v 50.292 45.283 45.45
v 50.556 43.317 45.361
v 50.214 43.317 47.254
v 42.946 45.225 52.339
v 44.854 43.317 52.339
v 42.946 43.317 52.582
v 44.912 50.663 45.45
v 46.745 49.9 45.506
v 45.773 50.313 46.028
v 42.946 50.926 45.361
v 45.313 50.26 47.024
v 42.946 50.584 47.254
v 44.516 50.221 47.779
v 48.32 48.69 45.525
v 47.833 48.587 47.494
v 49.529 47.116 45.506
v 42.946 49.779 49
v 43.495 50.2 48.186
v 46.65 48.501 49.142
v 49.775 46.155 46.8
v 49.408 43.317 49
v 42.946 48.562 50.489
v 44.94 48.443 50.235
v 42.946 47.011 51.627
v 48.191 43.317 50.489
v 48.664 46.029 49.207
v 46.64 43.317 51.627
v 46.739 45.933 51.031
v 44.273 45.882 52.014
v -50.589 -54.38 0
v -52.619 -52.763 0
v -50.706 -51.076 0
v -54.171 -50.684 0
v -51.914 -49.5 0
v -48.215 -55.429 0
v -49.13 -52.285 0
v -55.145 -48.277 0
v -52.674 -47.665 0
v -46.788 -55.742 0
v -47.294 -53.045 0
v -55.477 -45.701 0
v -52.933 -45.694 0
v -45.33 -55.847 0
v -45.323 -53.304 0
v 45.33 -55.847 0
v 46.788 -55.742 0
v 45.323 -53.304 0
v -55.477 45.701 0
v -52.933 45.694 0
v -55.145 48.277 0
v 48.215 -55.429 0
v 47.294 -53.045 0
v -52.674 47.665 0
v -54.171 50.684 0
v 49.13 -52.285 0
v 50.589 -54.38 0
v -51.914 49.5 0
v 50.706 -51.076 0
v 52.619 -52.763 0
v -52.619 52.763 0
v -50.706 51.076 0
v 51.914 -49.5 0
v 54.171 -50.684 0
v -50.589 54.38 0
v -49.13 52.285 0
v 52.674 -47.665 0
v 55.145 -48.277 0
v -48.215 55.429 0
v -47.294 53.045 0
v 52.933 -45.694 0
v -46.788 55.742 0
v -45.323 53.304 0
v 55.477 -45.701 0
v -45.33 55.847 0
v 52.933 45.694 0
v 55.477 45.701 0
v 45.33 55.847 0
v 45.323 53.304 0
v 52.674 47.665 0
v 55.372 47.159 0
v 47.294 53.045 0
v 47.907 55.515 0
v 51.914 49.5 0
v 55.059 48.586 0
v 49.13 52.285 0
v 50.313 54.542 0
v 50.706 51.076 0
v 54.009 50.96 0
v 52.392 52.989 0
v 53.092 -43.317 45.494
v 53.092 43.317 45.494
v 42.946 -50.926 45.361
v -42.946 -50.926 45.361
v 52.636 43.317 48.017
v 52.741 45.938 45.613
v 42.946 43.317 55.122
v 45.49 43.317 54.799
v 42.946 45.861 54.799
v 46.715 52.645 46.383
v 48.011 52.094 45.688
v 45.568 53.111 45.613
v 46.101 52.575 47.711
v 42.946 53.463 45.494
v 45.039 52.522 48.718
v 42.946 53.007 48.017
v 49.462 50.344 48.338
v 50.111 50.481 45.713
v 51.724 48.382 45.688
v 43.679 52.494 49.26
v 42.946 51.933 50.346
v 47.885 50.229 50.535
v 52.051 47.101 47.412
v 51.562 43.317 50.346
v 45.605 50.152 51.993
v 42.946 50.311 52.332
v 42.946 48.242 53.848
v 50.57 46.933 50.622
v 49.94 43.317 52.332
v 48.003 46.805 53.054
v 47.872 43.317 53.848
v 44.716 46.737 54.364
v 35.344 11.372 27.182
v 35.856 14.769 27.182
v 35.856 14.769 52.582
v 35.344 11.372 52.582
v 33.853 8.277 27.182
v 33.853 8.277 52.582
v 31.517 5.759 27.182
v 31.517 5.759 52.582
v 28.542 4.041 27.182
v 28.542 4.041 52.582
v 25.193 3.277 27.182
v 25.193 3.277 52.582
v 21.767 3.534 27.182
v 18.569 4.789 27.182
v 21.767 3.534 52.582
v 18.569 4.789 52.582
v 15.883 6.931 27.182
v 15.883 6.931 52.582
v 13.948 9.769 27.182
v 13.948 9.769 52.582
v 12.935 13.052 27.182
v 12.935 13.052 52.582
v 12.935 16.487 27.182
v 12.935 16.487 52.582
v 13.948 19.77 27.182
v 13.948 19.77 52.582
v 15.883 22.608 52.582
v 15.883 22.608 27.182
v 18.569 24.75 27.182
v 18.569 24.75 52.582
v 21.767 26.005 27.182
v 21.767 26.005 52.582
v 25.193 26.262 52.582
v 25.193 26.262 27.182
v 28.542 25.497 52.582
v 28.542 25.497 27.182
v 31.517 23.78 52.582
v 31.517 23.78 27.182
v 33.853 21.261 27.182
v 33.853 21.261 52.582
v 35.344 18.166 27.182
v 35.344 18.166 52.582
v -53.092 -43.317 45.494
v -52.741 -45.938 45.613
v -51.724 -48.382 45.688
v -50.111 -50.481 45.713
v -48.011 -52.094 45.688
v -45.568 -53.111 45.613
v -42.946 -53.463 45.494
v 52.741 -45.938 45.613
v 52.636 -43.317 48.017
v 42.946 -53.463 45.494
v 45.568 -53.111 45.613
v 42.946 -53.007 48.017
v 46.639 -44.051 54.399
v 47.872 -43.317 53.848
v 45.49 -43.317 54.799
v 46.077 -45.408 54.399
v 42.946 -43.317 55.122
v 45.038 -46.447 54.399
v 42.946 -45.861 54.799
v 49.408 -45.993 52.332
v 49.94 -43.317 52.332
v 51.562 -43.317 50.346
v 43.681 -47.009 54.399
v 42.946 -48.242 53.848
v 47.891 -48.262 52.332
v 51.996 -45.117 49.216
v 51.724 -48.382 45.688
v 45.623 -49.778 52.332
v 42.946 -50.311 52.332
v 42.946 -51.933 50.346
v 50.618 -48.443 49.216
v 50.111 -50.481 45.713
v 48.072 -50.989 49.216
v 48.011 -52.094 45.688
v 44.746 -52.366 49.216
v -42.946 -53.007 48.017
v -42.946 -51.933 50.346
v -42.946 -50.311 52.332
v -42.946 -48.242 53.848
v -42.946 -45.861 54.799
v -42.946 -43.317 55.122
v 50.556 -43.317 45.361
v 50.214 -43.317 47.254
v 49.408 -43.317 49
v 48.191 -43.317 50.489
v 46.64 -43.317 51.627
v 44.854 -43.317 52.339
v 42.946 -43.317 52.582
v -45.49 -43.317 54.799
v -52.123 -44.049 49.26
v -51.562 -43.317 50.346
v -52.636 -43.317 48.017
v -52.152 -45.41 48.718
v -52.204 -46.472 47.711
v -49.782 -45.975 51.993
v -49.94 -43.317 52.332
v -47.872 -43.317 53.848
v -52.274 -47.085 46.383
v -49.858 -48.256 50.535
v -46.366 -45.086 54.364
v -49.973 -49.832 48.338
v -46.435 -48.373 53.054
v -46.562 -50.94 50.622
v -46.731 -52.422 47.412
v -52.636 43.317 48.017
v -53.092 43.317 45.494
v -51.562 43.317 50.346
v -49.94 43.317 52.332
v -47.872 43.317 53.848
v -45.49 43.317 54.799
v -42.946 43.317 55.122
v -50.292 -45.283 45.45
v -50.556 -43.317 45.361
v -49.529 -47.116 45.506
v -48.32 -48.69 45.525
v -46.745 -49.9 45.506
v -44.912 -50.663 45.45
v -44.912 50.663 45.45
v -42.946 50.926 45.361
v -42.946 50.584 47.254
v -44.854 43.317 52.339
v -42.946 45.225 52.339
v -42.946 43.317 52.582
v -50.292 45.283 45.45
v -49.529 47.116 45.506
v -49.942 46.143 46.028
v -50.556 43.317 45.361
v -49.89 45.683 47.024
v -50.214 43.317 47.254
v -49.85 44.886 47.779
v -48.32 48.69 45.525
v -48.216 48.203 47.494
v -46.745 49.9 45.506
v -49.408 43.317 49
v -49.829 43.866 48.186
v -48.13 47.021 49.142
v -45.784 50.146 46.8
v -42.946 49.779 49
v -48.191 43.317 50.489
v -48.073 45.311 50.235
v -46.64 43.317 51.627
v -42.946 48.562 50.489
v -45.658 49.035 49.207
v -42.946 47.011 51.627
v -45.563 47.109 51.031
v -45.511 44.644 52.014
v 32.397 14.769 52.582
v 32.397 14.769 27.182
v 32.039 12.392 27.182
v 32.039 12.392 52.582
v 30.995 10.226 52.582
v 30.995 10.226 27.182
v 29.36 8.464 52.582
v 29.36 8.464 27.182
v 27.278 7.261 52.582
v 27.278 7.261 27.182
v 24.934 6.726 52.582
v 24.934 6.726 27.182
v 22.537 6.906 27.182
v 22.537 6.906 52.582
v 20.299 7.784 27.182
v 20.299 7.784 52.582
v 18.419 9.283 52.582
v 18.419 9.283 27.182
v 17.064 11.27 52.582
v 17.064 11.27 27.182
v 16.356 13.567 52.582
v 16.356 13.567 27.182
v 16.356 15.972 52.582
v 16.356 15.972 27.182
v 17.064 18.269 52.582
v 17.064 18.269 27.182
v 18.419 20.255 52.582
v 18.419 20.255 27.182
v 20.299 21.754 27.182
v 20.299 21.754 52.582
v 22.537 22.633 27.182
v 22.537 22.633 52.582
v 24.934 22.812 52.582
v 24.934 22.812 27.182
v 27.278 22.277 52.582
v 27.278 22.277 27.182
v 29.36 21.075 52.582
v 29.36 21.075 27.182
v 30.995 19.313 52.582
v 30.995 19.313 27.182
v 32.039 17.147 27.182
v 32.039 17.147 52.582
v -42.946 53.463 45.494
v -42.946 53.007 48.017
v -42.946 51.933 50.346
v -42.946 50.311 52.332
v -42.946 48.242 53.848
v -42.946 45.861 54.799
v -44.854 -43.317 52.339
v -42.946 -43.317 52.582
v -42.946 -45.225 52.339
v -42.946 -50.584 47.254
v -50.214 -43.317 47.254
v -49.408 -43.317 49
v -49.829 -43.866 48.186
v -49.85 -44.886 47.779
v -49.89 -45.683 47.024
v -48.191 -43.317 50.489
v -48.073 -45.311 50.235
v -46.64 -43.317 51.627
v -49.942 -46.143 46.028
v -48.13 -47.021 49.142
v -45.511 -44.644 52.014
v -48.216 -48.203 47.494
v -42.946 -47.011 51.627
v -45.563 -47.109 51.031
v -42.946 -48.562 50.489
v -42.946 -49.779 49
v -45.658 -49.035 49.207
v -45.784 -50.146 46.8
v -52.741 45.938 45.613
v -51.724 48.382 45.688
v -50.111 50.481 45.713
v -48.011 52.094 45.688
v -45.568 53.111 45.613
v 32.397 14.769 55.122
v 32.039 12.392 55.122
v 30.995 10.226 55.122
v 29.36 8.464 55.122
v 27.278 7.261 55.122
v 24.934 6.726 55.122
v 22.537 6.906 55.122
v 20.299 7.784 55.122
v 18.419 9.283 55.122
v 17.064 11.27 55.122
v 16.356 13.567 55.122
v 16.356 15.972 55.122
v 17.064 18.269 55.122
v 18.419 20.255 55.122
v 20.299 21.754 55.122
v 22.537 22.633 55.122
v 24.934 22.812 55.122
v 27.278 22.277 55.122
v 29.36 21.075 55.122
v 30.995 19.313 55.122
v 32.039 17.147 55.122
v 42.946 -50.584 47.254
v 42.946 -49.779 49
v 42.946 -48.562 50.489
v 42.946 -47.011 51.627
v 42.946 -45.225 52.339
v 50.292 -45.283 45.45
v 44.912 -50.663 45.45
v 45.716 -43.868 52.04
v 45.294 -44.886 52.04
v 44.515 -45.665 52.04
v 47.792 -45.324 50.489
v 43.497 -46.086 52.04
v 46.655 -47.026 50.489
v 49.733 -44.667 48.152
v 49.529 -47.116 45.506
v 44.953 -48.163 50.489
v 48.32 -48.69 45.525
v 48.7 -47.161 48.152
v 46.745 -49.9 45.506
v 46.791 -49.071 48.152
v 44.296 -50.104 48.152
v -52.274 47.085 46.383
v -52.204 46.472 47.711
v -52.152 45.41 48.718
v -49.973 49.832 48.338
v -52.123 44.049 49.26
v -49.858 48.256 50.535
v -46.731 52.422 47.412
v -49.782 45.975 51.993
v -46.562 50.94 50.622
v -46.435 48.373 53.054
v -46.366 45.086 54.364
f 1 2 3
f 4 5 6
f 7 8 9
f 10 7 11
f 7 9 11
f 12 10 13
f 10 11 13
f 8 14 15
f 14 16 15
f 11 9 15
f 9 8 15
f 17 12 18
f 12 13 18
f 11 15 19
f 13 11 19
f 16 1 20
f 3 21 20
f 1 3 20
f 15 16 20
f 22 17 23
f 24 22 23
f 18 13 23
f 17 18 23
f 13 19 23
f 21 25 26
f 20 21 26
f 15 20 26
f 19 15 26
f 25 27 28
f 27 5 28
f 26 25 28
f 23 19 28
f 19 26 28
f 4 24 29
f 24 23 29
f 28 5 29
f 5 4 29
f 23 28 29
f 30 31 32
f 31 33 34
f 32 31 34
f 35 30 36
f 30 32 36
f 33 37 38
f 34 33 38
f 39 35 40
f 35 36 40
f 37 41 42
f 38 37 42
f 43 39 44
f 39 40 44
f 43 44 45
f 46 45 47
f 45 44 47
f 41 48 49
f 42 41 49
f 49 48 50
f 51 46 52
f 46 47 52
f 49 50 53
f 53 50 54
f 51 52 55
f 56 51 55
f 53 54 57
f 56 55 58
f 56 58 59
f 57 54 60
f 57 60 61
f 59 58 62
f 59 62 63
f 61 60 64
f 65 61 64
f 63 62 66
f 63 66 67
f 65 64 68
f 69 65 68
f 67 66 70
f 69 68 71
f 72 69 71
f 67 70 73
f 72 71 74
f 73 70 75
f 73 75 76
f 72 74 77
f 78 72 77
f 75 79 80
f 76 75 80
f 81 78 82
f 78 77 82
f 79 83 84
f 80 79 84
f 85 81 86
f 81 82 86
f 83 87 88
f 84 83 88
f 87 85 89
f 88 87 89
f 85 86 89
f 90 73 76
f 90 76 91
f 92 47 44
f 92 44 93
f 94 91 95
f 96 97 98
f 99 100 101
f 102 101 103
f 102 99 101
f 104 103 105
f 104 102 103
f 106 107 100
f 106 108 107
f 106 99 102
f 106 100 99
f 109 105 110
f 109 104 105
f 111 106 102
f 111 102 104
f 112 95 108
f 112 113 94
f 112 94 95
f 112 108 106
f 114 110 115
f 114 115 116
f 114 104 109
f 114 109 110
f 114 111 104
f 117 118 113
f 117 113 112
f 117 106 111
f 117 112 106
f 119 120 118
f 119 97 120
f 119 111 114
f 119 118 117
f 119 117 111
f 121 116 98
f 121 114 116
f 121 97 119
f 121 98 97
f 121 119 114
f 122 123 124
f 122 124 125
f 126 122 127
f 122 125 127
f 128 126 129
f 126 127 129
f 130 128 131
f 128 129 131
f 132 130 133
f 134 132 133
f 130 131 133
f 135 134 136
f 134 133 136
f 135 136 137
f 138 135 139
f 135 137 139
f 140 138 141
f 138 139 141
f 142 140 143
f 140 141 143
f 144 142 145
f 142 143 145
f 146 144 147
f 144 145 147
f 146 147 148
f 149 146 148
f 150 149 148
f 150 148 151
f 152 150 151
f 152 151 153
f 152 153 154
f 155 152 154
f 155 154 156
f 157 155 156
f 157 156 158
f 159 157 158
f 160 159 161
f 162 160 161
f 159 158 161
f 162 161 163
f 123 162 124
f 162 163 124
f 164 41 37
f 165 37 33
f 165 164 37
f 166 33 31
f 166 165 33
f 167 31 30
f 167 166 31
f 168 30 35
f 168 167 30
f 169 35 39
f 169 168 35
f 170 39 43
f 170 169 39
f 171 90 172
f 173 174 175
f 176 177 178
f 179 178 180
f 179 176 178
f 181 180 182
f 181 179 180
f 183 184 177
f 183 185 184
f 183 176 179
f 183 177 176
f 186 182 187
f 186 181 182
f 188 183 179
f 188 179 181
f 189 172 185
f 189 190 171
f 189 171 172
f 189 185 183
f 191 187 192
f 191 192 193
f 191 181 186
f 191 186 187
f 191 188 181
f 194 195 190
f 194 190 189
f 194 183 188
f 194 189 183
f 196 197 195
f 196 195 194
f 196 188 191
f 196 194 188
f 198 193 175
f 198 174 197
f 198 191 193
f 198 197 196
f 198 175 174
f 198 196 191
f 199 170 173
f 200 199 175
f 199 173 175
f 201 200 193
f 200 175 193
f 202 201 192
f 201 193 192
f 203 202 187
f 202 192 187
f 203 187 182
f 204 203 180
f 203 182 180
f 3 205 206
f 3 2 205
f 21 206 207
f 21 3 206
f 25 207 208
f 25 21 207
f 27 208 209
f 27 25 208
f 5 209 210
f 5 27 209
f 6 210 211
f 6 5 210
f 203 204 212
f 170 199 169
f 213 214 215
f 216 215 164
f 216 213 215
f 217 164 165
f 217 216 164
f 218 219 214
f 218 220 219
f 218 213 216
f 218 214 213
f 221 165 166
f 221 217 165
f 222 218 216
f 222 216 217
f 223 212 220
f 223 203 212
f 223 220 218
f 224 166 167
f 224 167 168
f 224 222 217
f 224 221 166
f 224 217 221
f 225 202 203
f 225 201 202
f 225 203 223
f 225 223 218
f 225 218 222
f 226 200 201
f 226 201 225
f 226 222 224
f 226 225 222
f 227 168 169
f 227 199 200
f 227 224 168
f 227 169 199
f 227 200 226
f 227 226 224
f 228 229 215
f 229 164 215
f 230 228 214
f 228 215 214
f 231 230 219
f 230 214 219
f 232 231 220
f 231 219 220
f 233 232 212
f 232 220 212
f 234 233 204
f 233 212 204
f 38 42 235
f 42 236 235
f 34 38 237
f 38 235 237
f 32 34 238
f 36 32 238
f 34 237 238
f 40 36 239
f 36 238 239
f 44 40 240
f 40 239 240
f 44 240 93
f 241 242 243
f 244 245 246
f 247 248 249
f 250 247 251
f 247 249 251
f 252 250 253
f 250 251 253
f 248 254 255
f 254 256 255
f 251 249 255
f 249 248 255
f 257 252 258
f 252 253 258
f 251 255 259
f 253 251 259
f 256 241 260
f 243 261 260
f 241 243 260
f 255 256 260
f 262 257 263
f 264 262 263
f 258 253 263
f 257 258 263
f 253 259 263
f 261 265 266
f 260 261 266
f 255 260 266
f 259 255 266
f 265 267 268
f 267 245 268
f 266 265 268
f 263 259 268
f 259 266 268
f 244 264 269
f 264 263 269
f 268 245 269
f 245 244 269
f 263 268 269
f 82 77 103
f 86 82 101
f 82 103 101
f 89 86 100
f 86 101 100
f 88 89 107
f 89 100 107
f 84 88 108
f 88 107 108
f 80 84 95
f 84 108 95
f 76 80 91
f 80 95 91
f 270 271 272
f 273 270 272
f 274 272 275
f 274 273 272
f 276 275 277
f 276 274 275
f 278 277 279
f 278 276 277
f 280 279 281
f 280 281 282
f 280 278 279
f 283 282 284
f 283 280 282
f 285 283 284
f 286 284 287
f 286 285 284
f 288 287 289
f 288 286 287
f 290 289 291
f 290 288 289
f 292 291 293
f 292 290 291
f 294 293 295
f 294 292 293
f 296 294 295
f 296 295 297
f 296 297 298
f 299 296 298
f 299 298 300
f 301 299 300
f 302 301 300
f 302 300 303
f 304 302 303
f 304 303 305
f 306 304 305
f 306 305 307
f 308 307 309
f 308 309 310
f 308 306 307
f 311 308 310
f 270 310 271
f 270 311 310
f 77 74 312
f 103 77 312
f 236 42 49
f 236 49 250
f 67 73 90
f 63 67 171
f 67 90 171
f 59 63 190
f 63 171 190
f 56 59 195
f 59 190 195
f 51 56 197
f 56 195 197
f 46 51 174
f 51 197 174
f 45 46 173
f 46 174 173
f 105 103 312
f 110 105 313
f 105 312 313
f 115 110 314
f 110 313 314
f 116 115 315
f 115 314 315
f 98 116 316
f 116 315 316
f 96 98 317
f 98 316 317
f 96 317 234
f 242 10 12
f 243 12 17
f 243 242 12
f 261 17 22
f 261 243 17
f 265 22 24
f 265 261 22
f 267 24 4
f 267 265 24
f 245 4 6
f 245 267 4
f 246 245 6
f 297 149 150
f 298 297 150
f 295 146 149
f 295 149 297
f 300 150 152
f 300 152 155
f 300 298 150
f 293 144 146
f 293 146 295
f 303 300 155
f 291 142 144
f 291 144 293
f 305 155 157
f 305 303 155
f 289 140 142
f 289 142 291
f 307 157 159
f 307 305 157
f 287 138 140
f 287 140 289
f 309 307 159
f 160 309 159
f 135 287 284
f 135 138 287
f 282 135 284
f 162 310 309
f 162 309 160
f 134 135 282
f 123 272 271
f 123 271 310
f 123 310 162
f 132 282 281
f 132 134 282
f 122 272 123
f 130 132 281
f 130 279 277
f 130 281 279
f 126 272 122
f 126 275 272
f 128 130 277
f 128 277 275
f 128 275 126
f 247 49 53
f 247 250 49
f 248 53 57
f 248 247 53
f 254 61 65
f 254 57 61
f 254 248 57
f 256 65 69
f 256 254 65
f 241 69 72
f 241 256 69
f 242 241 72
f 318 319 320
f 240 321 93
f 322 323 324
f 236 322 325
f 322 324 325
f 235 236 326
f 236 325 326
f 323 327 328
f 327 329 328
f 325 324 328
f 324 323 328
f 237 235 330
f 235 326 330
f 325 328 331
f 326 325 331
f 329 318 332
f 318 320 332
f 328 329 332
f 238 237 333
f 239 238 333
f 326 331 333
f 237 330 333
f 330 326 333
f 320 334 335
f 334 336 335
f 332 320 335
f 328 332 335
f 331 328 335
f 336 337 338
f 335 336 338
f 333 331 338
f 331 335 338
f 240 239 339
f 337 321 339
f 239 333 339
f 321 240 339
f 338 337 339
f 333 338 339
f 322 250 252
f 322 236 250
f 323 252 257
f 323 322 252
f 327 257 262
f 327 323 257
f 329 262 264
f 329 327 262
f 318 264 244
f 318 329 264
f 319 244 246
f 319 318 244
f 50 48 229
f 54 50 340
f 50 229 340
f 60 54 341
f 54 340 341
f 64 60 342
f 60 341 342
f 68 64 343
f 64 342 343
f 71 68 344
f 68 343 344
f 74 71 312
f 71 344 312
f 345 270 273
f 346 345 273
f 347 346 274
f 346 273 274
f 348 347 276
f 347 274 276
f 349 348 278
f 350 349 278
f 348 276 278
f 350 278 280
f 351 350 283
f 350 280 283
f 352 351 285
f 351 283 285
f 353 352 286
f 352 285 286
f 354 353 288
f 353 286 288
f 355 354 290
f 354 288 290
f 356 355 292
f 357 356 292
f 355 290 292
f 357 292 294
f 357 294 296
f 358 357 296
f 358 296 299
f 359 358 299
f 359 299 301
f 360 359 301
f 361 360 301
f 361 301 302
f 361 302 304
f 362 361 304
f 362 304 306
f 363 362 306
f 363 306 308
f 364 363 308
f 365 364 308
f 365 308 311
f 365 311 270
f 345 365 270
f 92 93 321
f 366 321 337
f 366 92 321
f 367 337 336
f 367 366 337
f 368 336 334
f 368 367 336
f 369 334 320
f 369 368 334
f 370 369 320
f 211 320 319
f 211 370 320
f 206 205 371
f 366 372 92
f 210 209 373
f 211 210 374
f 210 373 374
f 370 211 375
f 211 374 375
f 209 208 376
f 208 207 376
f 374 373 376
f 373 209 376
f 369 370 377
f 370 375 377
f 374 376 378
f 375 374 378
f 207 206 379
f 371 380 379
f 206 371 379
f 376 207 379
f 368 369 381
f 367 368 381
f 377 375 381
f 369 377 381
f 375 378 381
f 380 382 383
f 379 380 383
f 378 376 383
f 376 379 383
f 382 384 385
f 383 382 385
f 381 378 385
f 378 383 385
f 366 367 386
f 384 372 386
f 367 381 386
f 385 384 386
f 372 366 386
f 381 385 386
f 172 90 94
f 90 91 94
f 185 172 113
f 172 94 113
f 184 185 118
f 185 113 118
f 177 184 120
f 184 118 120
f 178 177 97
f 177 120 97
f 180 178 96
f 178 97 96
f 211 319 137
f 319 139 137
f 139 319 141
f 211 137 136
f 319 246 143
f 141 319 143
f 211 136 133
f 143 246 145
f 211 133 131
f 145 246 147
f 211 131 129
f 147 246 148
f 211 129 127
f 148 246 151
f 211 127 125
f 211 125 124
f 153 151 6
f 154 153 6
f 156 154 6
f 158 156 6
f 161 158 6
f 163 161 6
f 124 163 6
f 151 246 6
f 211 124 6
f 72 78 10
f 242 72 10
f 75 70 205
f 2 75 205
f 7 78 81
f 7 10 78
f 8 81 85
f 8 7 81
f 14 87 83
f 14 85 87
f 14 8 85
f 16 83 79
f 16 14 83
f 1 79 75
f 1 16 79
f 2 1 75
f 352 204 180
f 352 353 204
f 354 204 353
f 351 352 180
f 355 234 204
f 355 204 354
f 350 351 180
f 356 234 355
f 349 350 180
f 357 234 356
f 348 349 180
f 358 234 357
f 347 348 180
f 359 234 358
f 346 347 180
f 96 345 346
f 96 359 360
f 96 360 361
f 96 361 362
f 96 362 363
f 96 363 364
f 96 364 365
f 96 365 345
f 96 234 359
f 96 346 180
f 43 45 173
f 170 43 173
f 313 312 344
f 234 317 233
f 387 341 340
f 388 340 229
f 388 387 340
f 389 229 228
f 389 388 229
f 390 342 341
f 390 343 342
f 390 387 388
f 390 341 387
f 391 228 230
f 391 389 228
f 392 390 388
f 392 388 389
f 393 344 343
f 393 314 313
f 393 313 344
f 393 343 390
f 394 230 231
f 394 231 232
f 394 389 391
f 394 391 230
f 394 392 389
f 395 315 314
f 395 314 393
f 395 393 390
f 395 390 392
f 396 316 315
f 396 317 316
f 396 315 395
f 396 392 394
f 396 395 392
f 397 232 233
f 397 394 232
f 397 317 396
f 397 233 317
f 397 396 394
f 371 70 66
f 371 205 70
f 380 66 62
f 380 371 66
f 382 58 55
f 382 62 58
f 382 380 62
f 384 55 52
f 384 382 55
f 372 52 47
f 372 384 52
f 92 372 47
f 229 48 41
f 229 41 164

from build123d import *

# Parameters (mm, degrees)
F0_W     = 110.9530478716
F0_H     = 111.6942763329
F1_DEPTH = 55.1221389323
F1_TAPER = 3
F2_R     = 10.16
F3_T     = -2.54
F4_R     = 11.5246315094
F4_R_2   = 8.0655463765
F5_DEPTH = 25.4
F6_DEPTH = 25.4


with BuildPart() as f1:
    # F0 (on Top) → F1 (new body)
    with BuildSketch(Plane.XY):
        Rectangle(F0_W, F0_H)
    extrude(amount=F1_DEPTH, taper=F1_TAPER)

    # F2
    f2_edges = [f1.edges().sort_by_distance(p)[0] for p in [
        (54.032109, -54.402724, 27.561069),
        (52.587695, 0, 55.122139),
        (0, -52.958309, 55.122139),
        (54.032109, 54.402724, 27.561069),
        (0, 52.958309, 55.122139),
        (-54.032109, 54.402724, 27.561069),
        (-52.587695, 0, 55.122139),
        (-54.032109, -54.402724, 27.561069),
    ]]
    fillet(f2_edges, radius=F2_R)

    # F3
    f3_openings = [f1.faces().sort_by_distance(p)[0] for p in [
        (0, 0, 0),
    ]]
    offset(amount=F3_T, openings=f3_openings)

    # F4 (on face) → F5 (join)
    with BuildSketch(Plane(origin=(0, 0, 52.5821389323), x_dir=(1, 0, 0), z_dir=(0, 0, -1))):
        with Locations((24.3312865496, -14.7694125772)):
            Circle(F4_R)
        with Locations((24.3312865496, -14.7694125772)):
            Circle(F4_R_2, mode=Mode.SUBTRACT)
    extrude(amount=F5_DEPTH)

    # F6 (cut): a face of the model
    f6_faces = [f1.faces().sort_by_distance(p)[0] for p in [
        (24.3312865496, 14.7694125772, 52.5821389323),
    ]]
    extrude(f6_faces, amount=-F6_DEPTH, mode=Mode.SUBTRACT)


solid = f1.part
